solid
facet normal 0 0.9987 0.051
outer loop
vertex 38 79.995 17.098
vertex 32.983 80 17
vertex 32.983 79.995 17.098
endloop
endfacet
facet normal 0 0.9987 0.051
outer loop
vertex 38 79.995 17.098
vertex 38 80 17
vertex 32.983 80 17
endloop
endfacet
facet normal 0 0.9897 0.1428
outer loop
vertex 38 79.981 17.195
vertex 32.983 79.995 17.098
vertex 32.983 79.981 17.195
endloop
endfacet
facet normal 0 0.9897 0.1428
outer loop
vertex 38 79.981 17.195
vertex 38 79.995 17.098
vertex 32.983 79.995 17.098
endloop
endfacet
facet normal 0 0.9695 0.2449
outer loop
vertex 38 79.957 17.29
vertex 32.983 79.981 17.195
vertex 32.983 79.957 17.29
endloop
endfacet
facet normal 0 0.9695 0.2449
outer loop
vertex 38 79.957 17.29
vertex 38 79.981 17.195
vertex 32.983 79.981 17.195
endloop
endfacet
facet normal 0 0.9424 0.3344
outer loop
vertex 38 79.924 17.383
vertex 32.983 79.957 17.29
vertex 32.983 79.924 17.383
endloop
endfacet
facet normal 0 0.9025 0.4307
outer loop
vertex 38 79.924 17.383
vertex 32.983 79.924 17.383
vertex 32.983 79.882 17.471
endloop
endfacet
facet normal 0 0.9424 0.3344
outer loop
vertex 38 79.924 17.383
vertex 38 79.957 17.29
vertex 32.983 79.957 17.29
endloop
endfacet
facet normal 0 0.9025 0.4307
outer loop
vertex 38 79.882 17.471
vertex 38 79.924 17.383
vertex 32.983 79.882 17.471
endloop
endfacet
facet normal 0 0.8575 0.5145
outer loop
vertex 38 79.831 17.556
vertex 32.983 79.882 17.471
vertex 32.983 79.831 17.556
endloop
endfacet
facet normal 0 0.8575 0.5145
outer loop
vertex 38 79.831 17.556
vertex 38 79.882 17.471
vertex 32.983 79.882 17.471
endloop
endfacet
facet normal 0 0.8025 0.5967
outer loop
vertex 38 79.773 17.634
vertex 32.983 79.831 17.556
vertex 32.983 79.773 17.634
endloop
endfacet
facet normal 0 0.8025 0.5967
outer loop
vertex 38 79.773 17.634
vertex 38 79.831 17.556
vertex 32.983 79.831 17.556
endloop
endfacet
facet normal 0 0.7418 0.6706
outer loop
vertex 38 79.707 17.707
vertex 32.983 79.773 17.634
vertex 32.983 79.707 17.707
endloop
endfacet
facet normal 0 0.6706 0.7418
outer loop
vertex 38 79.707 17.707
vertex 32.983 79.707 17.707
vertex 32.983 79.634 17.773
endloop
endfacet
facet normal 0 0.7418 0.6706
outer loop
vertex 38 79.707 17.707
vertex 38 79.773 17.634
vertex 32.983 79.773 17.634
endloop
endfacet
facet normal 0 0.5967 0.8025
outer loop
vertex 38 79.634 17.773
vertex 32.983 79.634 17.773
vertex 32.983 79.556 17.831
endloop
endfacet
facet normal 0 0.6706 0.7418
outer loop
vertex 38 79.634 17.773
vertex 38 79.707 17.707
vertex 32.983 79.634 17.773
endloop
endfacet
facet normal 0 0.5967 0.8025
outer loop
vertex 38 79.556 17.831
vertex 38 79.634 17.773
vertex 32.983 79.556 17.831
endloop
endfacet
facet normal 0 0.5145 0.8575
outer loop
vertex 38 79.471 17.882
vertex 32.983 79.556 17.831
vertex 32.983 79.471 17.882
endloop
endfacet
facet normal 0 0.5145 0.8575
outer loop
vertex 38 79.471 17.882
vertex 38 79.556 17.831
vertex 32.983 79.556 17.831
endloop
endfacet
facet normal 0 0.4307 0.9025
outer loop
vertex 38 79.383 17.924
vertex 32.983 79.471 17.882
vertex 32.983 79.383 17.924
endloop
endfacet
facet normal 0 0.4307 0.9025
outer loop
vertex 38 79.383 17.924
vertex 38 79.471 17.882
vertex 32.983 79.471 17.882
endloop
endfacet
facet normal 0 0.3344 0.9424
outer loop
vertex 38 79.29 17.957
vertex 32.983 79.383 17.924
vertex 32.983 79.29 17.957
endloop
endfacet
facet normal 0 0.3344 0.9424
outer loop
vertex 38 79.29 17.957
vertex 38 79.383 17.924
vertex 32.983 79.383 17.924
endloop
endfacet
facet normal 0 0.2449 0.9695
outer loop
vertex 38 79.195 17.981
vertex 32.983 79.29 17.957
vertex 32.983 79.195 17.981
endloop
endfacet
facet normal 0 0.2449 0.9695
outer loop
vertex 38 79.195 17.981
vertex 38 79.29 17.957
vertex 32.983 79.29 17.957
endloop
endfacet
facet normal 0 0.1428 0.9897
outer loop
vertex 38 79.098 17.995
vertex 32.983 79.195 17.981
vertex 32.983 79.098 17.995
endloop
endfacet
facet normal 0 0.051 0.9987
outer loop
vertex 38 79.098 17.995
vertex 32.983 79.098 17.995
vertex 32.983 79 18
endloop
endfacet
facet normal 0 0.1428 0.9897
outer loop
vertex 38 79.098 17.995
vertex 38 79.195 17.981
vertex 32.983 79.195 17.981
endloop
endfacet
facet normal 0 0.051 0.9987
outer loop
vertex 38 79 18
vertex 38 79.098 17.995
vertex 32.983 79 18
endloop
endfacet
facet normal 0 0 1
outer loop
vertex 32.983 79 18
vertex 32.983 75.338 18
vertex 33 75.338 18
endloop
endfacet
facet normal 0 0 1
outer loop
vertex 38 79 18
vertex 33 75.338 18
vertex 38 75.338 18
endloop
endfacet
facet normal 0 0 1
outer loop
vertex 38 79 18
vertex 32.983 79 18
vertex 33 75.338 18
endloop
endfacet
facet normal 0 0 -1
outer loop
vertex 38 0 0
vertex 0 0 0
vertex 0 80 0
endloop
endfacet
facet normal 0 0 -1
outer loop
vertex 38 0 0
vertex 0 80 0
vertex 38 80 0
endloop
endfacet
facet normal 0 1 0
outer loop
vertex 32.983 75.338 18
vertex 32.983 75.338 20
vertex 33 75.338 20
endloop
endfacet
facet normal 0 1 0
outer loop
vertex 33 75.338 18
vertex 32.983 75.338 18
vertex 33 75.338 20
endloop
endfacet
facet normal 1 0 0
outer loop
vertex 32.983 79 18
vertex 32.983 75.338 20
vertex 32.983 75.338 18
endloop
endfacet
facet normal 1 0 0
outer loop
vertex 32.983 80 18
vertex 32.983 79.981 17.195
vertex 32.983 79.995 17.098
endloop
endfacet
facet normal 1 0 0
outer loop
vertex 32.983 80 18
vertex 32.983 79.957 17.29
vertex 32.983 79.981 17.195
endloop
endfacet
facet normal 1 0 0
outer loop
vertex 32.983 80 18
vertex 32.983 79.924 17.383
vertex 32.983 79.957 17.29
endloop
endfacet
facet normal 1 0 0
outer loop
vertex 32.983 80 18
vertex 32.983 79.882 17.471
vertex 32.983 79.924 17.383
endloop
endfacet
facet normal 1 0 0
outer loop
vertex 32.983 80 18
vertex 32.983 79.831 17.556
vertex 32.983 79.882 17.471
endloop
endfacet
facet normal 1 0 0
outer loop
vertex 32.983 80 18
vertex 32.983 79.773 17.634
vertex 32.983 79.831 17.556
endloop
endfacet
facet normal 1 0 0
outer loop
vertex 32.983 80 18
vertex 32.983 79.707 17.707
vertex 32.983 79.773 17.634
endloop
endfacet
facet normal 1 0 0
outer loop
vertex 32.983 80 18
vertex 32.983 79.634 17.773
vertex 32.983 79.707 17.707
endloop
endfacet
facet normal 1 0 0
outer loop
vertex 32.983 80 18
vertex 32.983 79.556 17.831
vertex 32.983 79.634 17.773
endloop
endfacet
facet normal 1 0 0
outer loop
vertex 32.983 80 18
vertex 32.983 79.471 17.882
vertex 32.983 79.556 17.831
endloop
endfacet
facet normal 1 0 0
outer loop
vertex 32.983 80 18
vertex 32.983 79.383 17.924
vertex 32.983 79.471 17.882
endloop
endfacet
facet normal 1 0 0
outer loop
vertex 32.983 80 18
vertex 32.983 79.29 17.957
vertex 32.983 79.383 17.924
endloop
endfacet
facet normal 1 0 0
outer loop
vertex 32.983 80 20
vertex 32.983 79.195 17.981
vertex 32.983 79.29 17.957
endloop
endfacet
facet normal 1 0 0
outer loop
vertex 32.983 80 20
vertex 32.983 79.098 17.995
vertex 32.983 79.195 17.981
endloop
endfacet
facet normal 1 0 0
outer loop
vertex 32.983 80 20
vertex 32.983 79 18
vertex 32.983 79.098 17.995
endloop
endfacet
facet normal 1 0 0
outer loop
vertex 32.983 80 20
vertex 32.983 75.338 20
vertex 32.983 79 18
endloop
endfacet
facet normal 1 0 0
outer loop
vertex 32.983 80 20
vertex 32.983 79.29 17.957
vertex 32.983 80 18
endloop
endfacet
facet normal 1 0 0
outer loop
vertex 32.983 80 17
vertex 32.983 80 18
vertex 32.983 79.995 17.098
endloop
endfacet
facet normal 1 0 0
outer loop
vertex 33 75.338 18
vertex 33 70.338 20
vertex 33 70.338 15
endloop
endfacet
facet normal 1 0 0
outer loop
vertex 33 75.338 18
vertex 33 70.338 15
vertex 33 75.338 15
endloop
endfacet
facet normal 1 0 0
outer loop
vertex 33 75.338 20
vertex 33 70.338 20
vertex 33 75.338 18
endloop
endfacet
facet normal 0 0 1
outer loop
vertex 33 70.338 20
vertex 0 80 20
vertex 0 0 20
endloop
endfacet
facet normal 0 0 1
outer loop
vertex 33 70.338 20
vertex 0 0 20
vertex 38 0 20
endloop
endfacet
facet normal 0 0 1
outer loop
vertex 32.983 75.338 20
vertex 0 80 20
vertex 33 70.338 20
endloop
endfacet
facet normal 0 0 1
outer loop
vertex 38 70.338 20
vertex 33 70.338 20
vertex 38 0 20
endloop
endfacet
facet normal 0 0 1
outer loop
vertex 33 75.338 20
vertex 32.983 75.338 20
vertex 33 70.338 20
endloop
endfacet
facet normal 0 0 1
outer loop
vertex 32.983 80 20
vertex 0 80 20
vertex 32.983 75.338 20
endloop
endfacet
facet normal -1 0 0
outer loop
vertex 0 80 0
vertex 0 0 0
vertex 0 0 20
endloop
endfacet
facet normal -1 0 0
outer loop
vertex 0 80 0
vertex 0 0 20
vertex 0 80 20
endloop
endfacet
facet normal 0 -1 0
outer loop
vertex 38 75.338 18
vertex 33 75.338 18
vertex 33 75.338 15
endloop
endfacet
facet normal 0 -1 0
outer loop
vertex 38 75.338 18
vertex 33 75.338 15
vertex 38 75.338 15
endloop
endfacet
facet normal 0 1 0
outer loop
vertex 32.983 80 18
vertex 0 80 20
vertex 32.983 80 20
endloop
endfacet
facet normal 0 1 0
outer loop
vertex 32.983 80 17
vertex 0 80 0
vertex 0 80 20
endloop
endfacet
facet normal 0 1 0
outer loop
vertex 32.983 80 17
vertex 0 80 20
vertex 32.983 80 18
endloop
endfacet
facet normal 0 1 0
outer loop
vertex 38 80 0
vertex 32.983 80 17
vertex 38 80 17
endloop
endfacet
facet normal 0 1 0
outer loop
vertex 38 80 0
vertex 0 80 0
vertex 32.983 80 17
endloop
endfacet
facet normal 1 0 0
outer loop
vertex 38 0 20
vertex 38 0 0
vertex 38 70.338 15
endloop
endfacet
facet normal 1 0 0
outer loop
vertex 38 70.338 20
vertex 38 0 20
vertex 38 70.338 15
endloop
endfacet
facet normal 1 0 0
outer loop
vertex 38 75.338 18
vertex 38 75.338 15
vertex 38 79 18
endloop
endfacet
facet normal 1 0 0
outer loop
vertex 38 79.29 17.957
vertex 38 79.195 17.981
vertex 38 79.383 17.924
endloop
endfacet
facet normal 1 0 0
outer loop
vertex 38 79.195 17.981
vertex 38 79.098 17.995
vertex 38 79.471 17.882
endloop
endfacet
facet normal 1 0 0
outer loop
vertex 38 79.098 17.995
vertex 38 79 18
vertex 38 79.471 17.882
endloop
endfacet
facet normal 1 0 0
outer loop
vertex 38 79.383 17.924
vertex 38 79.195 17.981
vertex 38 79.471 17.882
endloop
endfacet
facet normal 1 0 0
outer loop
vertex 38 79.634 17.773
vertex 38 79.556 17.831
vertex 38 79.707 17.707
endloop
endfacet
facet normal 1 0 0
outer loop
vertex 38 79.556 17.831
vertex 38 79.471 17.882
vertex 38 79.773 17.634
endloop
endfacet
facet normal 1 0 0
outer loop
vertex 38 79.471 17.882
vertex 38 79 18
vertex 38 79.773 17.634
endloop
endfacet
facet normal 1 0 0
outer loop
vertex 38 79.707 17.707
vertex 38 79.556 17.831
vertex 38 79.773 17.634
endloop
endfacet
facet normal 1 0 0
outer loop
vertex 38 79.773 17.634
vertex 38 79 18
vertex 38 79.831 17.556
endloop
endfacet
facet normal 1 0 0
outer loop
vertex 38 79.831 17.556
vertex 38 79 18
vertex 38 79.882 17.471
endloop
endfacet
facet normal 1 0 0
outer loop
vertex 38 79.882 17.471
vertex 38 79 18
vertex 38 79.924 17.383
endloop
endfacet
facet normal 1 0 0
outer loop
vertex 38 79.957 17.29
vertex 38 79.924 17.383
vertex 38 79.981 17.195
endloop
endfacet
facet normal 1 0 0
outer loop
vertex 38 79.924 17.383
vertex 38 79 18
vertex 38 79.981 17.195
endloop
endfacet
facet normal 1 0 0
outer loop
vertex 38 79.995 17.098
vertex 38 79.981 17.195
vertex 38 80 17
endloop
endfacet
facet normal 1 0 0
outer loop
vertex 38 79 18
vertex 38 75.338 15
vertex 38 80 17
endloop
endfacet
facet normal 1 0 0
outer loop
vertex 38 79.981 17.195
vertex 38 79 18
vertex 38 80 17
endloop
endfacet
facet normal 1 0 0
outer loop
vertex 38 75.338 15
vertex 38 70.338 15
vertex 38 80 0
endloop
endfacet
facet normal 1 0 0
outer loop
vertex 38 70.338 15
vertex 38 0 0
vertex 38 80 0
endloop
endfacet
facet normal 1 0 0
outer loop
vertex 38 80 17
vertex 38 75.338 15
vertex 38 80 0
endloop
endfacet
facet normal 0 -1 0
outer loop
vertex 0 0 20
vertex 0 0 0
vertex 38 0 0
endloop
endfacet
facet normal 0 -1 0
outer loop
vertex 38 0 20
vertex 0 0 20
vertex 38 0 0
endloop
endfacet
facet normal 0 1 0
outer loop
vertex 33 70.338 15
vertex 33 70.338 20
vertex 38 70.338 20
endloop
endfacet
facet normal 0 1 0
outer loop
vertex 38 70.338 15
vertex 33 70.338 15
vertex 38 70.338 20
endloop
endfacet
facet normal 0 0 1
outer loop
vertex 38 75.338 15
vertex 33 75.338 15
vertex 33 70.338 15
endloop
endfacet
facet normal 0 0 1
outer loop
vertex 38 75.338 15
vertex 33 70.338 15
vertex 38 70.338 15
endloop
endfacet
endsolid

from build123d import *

# Parameters (mm, degrees)
SKETCH_W        = 38
SKETCH_H        = 80
PAD_DEPTH       = 20
SKETCH001_W     = 5
SKETCH001_H     = 5
POCKET_DEPTH    = 5
SKETCH002_W     = 5.01717
SKETCH002_H     = 4.6615971845
POCKET001_DEPTH = 2
FILLET_R        = 1


with BuildPart() as part:
    # Sketch → Pad (new body)
    with BuildSketch(Plane.XY):
        with Locations((19, 40)):
            Rectangle(SKETCH_W, SKETCH_H)
    extrude(amount=PAD_DEPTH)

    # Sketch001 (on Face6 of Pad) → Pocket (cut)
    with BuildSketch(Plane.XY.offset(20)):
        with Locations((35.5, 72.8384028155)):
            Rectangle(SKETCH001_W, SKETCH001_H)
    extrude(amount=-POCKET_DEPTH, mode=Mode.SUBTRACT)

    # Sketch002 (on Face5 of Pocket) → Pocket001 (cut)
    with BuildSketch(Plane.XY.offset(20)):
        with Locations((35.491415, 77.6692014078)):
            Rectangle(SKETCH002_W, SKETCH002_H)
    extrude(amount=-POCKET001_DEPTH, mode=Mode.SUBTRACT)

    # Fillet
    fillet_edges = [part.edges().sort_by_distance(p)[0] for p in [
        (35.491415, 80, 18),
    ]]
    fillet(fillet_edges, radius=FILLET_R)


solid = part.part
